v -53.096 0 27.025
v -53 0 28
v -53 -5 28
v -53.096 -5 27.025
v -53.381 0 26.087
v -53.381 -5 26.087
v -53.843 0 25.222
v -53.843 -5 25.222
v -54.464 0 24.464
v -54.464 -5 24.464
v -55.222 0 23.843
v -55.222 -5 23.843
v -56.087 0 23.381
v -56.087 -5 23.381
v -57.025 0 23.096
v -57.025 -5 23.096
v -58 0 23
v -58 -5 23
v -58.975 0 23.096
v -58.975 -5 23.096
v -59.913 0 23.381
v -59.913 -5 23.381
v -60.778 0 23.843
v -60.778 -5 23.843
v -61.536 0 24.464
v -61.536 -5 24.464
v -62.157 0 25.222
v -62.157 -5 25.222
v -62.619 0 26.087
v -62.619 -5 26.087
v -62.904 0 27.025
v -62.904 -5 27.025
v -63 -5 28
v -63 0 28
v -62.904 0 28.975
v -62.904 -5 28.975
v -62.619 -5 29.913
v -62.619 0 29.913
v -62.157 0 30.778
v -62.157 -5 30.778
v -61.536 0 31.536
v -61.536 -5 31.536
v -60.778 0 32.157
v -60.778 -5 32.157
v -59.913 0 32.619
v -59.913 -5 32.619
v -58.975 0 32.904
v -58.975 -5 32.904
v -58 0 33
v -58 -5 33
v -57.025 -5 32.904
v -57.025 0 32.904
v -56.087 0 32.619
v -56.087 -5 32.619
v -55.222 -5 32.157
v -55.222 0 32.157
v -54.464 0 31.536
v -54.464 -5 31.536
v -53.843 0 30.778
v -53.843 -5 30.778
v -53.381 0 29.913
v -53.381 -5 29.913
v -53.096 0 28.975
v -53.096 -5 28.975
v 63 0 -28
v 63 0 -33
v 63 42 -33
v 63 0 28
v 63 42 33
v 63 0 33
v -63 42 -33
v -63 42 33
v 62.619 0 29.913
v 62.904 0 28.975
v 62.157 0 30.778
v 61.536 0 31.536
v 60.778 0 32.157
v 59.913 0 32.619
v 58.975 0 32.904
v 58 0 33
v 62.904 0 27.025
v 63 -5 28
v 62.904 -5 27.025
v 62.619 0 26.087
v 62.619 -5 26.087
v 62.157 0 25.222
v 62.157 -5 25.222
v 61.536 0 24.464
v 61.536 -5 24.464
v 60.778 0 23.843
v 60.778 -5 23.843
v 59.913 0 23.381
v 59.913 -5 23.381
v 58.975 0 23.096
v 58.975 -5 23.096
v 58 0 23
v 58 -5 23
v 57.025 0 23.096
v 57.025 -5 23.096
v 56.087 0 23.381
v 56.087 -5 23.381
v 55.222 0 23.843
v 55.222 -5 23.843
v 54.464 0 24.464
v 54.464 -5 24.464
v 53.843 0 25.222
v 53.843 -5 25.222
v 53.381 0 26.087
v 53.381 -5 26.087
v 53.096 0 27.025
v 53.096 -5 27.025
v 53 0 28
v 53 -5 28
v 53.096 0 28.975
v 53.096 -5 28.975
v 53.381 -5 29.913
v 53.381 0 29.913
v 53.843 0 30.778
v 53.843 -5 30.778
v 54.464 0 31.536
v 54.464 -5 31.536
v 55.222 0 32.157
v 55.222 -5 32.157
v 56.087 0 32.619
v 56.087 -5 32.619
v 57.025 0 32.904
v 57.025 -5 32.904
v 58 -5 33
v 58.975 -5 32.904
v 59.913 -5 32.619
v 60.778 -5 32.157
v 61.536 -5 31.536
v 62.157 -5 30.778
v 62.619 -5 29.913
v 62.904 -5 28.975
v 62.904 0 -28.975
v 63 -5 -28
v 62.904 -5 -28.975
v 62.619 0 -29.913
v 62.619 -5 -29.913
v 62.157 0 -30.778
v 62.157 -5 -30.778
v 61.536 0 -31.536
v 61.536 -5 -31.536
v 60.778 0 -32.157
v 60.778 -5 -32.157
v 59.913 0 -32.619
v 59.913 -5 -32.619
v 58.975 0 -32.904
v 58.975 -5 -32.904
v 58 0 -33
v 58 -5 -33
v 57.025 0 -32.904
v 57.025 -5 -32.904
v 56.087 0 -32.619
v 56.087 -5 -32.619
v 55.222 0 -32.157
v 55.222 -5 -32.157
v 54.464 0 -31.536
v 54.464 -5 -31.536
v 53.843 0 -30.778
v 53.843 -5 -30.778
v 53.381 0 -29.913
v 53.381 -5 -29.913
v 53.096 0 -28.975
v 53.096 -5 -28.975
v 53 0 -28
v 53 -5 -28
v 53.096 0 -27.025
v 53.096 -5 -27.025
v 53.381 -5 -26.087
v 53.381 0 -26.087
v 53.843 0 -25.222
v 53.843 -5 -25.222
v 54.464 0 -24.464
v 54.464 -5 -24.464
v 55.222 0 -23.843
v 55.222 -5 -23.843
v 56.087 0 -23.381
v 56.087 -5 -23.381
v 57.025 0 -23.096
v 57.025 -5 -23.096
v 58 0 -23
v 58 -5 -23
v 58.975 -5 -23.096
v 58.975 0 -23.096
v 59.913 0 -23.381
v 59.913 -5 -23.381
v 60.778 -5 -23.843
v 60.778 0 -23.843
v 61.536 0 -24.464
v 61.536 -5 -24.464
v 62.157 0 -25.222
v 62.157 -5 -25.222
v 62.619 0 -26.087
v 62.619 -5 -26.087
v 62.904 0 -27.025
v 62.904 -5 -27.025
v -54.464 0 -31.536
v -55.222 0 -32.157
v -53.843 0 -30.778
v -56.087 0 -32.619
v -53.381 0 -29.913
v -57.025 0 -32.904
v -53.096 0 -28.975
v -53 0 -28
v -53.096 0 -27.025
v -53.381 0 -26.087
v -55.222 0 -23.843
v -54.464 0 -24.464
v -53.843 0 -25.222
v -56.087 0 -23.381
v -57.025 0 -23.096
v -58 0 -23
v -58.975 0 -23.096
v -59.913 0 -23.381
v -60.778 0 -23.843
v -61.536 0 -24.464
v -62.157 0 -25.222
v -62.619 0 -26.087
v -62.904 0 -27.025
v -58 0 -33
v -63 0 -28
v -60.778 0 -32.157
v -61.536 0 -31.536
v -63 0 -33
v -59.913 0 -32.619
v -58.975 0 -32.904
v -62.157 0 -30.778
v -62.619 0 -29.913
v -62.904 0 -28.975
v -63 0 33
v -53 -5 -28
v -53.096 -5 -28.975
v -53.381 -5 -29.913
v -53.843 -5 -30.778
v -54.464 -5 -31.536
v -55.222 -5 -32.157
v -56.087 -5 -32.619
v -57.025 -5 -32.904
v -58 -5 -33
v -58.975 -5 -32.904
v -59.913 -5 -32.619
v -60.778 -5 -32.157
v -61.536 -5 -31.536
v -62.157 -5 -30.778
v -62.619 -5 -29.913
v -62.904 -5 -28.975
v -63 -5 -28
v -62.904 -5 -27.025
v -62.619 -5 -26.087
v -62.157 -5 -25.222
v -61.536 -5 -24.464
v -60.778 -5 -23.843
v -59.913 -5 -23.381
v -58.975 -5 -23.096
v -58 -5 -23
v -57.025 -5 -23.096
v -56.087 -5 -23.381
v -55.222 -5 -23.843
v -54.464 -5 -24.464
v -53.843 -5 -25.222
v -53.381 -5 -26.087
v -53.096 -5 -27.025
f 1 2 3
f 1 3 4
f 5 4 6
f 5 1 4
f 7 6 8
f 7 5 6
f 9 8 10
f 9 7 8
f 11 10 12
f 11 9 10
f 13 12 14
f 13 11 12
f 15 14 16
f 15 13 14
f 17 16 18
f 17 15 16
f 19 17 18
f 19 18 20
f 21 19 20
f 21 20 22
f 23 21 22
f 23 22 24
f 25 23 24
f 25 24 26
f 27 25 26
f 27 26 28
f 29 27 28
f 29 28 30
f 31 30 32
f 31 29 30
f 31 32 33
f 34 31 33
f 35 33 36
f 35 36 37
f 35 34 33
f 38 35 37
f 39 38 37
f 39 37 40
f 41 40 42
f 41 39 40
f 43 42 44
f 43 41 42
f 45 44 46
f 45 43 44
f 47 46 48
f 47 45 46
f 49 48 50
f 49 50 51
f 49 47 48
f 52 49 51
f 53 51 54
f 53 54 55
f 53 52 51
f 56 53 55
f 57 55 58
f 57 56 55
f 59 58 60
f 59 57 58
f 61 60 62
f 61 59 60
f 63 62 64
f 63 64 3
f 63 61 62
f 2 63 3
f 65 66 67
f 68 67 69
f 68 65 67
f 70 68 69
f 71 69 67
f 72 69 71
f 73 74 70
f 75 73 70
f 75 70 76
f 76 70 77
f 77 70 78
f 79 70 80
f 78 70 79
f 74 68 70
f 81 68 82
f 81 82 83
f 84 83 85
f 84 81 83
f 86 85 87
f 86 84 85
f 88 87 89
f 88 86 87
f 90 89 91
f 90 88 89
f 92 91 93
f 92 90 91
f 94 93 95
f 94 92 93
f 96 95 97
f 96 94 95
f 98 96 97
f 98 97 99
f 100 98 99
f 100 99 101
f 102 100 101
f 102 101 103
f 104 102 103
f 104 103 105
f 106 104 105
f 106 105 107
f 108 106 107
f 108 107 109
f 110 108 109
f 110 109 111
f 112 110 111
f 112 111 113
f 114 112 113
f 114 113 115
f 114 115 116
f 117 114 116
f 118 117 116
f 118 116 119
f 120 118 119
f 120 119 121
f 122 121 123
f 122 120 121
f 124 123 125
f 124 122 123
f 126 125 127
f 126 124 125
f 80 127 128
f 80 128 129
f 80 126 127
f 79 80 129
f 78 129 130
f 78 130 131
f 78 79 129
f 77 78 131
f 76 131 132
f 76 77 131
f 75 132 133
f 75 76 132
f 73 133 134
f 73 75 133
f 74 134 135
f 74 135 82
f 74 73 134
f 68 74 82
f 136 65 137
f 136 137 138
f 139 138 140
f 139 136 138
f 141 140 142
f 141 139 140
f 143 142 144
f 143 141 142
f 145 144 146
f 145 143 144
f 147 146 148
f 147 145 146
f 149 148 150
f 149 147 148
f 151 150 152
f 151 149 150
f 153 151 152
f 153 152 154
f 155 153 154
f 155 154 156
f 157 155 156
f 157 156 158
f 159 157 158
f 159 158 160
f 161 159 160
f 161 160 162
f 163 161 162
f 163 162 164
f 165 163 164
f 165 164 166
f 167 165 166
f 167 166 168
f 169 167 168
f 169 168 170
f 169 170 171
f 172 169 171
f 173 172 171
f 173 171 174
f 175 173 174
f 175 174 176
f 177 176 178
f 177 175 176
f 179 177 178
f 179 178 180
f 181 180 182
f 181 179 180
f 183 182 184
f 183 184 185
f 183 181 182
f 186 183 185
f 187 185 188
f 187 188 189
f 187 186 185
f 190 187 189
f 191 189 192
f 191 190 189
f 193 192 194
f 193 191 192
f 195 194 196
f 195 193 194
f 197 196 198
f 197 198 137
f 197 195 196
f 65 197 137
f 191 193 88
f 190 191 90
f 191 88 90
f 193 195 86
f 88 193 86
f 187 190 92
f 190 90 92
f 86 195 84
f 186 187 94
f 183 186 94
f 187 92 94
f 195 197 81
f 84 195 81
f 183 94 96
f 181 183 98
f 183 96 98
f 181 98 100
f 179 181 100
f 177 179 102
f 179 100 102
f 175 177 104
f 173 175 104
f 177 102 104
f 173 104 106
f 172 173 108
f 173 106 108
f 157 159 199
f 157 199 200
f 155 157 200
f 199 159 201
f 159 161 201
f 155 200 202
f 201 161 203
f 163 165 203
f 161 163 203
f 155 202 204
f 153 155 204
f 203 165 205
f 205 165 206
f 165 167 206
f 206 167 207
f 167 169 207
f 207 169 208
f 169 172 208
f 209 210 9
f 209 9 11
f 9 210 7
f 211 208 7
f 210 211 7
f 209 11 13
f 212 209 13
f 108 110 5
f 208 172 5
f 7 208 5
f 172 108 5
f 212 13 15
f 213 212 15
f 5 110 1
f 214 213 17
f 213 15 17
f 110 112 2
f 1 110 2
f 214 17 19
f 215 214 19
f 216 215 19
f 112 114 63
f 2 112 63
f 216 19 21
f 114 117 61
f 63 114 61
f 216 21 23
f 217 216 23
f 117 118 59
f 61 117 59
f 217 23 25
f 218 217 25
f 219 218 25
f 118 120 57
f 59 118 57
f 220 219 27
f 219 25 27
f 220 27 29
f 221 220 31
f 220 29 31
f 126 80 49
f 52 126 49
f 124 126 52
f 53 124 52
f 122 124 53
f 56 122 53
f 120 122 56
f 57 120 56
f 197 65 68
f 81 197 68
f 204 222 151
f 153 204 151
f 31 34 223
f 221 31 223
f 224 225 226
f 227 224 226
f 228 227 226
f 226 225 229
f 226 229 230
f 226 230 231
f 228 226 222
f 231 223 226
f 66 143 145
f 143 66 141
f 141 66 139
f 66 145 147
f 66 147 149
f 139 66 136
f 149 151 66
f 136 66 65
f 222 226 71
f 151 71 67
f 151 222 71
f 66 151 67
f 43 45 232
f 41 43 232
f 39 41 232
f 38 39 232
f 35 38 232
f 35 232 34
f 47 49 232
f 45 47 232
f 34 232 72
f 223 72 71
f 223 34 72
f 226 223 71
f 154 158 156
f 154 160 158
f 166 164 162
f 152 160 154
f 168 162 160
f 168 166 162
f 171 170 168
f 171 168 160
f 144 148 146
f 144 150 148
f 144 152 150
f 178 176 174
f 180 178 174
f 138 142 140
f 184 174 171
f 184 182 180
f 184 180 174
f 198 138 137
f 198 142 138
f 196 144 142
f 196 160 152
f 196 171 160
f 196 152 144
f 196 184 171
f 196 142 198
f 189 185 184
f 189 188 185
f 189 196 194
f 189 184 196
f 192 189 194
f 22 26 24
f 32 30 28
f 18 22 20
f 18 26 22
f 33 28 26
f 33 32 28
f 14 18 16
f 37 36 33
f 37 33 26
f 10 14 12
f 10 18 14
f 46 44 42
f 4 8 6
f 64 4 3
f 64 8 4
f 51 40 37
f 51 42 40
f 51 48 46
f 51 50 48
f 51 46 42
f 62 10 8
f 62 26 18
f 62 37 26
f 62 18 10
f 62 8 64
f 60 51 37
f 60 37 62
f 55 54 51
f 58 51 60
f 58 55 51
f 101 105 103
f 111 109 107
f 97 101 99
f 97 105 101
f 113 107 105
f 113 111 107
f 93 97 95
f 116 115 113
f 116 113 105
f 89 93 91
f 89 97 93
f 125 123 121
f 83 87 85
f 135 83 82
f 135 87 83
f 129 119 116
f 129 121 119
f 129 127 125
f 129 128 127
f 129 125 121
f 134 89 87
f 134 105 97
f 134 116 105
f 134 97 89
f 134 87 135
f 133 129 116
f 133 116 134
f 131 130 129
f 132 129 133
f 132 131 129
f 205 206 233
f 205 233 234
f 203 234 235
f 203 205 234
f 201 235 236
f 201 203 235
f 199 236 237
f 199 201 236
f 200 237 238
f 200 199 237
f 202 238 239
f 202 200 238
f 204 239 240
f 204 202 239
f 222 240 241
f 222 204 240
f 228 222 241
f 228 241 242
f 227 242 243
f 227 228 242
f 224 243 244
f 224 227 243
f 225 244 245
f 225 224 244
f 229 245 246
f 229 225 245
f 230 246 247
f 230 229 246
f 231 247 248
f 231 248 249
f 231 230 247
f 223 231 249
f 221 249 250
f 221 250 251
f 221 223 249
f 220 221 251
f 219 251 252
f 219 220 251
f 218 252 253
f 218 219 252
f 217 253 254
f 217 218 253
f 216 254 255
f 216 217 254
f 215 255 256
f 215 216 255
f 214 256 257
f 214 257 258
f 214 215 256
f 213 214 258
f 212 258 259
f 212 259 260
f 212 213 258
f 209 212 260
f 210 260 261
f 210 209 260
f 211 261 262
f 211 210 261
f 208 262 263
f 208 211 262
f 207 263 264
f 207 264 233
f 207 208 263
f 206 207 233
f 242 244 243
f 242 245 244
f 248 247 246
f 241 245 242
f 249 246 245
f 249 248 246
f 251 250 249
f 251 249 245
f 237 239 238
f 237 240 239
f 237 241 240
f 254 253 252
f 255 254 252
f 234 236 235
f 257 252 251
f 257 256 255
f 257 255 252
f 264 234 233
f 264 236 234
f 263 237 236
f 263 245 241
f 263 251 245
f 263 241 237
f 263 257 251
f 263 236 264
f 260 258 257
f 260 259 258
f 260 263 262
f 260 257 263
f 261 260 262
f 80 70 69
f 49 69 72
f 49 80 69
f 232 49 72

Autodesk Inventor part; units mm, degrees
ref_plane "YZ Plane" through (0, 0, 0) normal (1, 0, 0) x (0, 1, 0)
ref_plane "XZ Plane" through (0, 0, 0) normal (0, 1, 0) x (-1, 0, 0)
ref_plane "XY Plane" through (0, 0, 0) normal (0, 0, 1) x (1, 0, 0)
sketch "Szkic1" plane through (0, 0, 0) normal (0, 1, 0) x (-1, 0, 0)
  line L0 (63, -33) -> (-63, -33)
  line L1 (-63, -33) -> (-63, 33)
  line L2 (-63, 33) -> (63, 33)
  line L3 (63, 33) -> (63, -33)
  line L4 (63, -33) -> (-63, 33) construction
  line L5 (-63, -33) -> (63, 33) construction
  point P0 (0, 0)
  dimension "d0" = 126
  dimension "d1" = 66
extrude "Wyciągnięcie proste1" add sketch "Szkic1" along normal blind 42
sketch "Szkic2" plane through (0, 0, 0) normal (0, -1, 0) x (1, 0, 0)
  line L0 (-63, -33) -> (63, -33) projected
  line L1 (63, -33) -> (63, 33) projected
  line L2 (63, 33) -> (-63, 33) projected
  line L3 (-63, 33) -> (-63, -33) projected
  line L4 (-58, 28) -> (58, 28)
  line L5 (58, 28) -> (58, -28)
  line L6 (58, -28) -> (-58, -28)
  line L7 (-58, -28) -> (-58, 28)
  circle A0 centre (-58, 28) radius 5
  circle A1 centre (58, 28) radius 5
  circle A2 centre (58, -28) radius 5
  circle A3 centre (-58, -28) radius 5
  point P0 (0, 0)
  dimension "d4" = 5
  dimension "d5" = 10
  dimension "d6" = 10
  dimension "d7" = 10
  dimension "d8" = 10
extrude "Wyciągnięcie proste2" add sketch "Szkic2" along normal blind 5 contours A3 L7 L6 | A2 L6 L5 | L6 L7 A3 | A0 L4 L7 | A2 L5 L6 | L7 L4 A0 | A1 L5 L4 | A1 L4 L5
equation "\"d5\" = 2 * d4"
equation "\"d6\" = 2 * d4"
equation "\"d7\" = 2 * d4"
equation "\"d8\" = 2 * d4"
equation "\"d9\" = d4"
properties part number "czujnik"
